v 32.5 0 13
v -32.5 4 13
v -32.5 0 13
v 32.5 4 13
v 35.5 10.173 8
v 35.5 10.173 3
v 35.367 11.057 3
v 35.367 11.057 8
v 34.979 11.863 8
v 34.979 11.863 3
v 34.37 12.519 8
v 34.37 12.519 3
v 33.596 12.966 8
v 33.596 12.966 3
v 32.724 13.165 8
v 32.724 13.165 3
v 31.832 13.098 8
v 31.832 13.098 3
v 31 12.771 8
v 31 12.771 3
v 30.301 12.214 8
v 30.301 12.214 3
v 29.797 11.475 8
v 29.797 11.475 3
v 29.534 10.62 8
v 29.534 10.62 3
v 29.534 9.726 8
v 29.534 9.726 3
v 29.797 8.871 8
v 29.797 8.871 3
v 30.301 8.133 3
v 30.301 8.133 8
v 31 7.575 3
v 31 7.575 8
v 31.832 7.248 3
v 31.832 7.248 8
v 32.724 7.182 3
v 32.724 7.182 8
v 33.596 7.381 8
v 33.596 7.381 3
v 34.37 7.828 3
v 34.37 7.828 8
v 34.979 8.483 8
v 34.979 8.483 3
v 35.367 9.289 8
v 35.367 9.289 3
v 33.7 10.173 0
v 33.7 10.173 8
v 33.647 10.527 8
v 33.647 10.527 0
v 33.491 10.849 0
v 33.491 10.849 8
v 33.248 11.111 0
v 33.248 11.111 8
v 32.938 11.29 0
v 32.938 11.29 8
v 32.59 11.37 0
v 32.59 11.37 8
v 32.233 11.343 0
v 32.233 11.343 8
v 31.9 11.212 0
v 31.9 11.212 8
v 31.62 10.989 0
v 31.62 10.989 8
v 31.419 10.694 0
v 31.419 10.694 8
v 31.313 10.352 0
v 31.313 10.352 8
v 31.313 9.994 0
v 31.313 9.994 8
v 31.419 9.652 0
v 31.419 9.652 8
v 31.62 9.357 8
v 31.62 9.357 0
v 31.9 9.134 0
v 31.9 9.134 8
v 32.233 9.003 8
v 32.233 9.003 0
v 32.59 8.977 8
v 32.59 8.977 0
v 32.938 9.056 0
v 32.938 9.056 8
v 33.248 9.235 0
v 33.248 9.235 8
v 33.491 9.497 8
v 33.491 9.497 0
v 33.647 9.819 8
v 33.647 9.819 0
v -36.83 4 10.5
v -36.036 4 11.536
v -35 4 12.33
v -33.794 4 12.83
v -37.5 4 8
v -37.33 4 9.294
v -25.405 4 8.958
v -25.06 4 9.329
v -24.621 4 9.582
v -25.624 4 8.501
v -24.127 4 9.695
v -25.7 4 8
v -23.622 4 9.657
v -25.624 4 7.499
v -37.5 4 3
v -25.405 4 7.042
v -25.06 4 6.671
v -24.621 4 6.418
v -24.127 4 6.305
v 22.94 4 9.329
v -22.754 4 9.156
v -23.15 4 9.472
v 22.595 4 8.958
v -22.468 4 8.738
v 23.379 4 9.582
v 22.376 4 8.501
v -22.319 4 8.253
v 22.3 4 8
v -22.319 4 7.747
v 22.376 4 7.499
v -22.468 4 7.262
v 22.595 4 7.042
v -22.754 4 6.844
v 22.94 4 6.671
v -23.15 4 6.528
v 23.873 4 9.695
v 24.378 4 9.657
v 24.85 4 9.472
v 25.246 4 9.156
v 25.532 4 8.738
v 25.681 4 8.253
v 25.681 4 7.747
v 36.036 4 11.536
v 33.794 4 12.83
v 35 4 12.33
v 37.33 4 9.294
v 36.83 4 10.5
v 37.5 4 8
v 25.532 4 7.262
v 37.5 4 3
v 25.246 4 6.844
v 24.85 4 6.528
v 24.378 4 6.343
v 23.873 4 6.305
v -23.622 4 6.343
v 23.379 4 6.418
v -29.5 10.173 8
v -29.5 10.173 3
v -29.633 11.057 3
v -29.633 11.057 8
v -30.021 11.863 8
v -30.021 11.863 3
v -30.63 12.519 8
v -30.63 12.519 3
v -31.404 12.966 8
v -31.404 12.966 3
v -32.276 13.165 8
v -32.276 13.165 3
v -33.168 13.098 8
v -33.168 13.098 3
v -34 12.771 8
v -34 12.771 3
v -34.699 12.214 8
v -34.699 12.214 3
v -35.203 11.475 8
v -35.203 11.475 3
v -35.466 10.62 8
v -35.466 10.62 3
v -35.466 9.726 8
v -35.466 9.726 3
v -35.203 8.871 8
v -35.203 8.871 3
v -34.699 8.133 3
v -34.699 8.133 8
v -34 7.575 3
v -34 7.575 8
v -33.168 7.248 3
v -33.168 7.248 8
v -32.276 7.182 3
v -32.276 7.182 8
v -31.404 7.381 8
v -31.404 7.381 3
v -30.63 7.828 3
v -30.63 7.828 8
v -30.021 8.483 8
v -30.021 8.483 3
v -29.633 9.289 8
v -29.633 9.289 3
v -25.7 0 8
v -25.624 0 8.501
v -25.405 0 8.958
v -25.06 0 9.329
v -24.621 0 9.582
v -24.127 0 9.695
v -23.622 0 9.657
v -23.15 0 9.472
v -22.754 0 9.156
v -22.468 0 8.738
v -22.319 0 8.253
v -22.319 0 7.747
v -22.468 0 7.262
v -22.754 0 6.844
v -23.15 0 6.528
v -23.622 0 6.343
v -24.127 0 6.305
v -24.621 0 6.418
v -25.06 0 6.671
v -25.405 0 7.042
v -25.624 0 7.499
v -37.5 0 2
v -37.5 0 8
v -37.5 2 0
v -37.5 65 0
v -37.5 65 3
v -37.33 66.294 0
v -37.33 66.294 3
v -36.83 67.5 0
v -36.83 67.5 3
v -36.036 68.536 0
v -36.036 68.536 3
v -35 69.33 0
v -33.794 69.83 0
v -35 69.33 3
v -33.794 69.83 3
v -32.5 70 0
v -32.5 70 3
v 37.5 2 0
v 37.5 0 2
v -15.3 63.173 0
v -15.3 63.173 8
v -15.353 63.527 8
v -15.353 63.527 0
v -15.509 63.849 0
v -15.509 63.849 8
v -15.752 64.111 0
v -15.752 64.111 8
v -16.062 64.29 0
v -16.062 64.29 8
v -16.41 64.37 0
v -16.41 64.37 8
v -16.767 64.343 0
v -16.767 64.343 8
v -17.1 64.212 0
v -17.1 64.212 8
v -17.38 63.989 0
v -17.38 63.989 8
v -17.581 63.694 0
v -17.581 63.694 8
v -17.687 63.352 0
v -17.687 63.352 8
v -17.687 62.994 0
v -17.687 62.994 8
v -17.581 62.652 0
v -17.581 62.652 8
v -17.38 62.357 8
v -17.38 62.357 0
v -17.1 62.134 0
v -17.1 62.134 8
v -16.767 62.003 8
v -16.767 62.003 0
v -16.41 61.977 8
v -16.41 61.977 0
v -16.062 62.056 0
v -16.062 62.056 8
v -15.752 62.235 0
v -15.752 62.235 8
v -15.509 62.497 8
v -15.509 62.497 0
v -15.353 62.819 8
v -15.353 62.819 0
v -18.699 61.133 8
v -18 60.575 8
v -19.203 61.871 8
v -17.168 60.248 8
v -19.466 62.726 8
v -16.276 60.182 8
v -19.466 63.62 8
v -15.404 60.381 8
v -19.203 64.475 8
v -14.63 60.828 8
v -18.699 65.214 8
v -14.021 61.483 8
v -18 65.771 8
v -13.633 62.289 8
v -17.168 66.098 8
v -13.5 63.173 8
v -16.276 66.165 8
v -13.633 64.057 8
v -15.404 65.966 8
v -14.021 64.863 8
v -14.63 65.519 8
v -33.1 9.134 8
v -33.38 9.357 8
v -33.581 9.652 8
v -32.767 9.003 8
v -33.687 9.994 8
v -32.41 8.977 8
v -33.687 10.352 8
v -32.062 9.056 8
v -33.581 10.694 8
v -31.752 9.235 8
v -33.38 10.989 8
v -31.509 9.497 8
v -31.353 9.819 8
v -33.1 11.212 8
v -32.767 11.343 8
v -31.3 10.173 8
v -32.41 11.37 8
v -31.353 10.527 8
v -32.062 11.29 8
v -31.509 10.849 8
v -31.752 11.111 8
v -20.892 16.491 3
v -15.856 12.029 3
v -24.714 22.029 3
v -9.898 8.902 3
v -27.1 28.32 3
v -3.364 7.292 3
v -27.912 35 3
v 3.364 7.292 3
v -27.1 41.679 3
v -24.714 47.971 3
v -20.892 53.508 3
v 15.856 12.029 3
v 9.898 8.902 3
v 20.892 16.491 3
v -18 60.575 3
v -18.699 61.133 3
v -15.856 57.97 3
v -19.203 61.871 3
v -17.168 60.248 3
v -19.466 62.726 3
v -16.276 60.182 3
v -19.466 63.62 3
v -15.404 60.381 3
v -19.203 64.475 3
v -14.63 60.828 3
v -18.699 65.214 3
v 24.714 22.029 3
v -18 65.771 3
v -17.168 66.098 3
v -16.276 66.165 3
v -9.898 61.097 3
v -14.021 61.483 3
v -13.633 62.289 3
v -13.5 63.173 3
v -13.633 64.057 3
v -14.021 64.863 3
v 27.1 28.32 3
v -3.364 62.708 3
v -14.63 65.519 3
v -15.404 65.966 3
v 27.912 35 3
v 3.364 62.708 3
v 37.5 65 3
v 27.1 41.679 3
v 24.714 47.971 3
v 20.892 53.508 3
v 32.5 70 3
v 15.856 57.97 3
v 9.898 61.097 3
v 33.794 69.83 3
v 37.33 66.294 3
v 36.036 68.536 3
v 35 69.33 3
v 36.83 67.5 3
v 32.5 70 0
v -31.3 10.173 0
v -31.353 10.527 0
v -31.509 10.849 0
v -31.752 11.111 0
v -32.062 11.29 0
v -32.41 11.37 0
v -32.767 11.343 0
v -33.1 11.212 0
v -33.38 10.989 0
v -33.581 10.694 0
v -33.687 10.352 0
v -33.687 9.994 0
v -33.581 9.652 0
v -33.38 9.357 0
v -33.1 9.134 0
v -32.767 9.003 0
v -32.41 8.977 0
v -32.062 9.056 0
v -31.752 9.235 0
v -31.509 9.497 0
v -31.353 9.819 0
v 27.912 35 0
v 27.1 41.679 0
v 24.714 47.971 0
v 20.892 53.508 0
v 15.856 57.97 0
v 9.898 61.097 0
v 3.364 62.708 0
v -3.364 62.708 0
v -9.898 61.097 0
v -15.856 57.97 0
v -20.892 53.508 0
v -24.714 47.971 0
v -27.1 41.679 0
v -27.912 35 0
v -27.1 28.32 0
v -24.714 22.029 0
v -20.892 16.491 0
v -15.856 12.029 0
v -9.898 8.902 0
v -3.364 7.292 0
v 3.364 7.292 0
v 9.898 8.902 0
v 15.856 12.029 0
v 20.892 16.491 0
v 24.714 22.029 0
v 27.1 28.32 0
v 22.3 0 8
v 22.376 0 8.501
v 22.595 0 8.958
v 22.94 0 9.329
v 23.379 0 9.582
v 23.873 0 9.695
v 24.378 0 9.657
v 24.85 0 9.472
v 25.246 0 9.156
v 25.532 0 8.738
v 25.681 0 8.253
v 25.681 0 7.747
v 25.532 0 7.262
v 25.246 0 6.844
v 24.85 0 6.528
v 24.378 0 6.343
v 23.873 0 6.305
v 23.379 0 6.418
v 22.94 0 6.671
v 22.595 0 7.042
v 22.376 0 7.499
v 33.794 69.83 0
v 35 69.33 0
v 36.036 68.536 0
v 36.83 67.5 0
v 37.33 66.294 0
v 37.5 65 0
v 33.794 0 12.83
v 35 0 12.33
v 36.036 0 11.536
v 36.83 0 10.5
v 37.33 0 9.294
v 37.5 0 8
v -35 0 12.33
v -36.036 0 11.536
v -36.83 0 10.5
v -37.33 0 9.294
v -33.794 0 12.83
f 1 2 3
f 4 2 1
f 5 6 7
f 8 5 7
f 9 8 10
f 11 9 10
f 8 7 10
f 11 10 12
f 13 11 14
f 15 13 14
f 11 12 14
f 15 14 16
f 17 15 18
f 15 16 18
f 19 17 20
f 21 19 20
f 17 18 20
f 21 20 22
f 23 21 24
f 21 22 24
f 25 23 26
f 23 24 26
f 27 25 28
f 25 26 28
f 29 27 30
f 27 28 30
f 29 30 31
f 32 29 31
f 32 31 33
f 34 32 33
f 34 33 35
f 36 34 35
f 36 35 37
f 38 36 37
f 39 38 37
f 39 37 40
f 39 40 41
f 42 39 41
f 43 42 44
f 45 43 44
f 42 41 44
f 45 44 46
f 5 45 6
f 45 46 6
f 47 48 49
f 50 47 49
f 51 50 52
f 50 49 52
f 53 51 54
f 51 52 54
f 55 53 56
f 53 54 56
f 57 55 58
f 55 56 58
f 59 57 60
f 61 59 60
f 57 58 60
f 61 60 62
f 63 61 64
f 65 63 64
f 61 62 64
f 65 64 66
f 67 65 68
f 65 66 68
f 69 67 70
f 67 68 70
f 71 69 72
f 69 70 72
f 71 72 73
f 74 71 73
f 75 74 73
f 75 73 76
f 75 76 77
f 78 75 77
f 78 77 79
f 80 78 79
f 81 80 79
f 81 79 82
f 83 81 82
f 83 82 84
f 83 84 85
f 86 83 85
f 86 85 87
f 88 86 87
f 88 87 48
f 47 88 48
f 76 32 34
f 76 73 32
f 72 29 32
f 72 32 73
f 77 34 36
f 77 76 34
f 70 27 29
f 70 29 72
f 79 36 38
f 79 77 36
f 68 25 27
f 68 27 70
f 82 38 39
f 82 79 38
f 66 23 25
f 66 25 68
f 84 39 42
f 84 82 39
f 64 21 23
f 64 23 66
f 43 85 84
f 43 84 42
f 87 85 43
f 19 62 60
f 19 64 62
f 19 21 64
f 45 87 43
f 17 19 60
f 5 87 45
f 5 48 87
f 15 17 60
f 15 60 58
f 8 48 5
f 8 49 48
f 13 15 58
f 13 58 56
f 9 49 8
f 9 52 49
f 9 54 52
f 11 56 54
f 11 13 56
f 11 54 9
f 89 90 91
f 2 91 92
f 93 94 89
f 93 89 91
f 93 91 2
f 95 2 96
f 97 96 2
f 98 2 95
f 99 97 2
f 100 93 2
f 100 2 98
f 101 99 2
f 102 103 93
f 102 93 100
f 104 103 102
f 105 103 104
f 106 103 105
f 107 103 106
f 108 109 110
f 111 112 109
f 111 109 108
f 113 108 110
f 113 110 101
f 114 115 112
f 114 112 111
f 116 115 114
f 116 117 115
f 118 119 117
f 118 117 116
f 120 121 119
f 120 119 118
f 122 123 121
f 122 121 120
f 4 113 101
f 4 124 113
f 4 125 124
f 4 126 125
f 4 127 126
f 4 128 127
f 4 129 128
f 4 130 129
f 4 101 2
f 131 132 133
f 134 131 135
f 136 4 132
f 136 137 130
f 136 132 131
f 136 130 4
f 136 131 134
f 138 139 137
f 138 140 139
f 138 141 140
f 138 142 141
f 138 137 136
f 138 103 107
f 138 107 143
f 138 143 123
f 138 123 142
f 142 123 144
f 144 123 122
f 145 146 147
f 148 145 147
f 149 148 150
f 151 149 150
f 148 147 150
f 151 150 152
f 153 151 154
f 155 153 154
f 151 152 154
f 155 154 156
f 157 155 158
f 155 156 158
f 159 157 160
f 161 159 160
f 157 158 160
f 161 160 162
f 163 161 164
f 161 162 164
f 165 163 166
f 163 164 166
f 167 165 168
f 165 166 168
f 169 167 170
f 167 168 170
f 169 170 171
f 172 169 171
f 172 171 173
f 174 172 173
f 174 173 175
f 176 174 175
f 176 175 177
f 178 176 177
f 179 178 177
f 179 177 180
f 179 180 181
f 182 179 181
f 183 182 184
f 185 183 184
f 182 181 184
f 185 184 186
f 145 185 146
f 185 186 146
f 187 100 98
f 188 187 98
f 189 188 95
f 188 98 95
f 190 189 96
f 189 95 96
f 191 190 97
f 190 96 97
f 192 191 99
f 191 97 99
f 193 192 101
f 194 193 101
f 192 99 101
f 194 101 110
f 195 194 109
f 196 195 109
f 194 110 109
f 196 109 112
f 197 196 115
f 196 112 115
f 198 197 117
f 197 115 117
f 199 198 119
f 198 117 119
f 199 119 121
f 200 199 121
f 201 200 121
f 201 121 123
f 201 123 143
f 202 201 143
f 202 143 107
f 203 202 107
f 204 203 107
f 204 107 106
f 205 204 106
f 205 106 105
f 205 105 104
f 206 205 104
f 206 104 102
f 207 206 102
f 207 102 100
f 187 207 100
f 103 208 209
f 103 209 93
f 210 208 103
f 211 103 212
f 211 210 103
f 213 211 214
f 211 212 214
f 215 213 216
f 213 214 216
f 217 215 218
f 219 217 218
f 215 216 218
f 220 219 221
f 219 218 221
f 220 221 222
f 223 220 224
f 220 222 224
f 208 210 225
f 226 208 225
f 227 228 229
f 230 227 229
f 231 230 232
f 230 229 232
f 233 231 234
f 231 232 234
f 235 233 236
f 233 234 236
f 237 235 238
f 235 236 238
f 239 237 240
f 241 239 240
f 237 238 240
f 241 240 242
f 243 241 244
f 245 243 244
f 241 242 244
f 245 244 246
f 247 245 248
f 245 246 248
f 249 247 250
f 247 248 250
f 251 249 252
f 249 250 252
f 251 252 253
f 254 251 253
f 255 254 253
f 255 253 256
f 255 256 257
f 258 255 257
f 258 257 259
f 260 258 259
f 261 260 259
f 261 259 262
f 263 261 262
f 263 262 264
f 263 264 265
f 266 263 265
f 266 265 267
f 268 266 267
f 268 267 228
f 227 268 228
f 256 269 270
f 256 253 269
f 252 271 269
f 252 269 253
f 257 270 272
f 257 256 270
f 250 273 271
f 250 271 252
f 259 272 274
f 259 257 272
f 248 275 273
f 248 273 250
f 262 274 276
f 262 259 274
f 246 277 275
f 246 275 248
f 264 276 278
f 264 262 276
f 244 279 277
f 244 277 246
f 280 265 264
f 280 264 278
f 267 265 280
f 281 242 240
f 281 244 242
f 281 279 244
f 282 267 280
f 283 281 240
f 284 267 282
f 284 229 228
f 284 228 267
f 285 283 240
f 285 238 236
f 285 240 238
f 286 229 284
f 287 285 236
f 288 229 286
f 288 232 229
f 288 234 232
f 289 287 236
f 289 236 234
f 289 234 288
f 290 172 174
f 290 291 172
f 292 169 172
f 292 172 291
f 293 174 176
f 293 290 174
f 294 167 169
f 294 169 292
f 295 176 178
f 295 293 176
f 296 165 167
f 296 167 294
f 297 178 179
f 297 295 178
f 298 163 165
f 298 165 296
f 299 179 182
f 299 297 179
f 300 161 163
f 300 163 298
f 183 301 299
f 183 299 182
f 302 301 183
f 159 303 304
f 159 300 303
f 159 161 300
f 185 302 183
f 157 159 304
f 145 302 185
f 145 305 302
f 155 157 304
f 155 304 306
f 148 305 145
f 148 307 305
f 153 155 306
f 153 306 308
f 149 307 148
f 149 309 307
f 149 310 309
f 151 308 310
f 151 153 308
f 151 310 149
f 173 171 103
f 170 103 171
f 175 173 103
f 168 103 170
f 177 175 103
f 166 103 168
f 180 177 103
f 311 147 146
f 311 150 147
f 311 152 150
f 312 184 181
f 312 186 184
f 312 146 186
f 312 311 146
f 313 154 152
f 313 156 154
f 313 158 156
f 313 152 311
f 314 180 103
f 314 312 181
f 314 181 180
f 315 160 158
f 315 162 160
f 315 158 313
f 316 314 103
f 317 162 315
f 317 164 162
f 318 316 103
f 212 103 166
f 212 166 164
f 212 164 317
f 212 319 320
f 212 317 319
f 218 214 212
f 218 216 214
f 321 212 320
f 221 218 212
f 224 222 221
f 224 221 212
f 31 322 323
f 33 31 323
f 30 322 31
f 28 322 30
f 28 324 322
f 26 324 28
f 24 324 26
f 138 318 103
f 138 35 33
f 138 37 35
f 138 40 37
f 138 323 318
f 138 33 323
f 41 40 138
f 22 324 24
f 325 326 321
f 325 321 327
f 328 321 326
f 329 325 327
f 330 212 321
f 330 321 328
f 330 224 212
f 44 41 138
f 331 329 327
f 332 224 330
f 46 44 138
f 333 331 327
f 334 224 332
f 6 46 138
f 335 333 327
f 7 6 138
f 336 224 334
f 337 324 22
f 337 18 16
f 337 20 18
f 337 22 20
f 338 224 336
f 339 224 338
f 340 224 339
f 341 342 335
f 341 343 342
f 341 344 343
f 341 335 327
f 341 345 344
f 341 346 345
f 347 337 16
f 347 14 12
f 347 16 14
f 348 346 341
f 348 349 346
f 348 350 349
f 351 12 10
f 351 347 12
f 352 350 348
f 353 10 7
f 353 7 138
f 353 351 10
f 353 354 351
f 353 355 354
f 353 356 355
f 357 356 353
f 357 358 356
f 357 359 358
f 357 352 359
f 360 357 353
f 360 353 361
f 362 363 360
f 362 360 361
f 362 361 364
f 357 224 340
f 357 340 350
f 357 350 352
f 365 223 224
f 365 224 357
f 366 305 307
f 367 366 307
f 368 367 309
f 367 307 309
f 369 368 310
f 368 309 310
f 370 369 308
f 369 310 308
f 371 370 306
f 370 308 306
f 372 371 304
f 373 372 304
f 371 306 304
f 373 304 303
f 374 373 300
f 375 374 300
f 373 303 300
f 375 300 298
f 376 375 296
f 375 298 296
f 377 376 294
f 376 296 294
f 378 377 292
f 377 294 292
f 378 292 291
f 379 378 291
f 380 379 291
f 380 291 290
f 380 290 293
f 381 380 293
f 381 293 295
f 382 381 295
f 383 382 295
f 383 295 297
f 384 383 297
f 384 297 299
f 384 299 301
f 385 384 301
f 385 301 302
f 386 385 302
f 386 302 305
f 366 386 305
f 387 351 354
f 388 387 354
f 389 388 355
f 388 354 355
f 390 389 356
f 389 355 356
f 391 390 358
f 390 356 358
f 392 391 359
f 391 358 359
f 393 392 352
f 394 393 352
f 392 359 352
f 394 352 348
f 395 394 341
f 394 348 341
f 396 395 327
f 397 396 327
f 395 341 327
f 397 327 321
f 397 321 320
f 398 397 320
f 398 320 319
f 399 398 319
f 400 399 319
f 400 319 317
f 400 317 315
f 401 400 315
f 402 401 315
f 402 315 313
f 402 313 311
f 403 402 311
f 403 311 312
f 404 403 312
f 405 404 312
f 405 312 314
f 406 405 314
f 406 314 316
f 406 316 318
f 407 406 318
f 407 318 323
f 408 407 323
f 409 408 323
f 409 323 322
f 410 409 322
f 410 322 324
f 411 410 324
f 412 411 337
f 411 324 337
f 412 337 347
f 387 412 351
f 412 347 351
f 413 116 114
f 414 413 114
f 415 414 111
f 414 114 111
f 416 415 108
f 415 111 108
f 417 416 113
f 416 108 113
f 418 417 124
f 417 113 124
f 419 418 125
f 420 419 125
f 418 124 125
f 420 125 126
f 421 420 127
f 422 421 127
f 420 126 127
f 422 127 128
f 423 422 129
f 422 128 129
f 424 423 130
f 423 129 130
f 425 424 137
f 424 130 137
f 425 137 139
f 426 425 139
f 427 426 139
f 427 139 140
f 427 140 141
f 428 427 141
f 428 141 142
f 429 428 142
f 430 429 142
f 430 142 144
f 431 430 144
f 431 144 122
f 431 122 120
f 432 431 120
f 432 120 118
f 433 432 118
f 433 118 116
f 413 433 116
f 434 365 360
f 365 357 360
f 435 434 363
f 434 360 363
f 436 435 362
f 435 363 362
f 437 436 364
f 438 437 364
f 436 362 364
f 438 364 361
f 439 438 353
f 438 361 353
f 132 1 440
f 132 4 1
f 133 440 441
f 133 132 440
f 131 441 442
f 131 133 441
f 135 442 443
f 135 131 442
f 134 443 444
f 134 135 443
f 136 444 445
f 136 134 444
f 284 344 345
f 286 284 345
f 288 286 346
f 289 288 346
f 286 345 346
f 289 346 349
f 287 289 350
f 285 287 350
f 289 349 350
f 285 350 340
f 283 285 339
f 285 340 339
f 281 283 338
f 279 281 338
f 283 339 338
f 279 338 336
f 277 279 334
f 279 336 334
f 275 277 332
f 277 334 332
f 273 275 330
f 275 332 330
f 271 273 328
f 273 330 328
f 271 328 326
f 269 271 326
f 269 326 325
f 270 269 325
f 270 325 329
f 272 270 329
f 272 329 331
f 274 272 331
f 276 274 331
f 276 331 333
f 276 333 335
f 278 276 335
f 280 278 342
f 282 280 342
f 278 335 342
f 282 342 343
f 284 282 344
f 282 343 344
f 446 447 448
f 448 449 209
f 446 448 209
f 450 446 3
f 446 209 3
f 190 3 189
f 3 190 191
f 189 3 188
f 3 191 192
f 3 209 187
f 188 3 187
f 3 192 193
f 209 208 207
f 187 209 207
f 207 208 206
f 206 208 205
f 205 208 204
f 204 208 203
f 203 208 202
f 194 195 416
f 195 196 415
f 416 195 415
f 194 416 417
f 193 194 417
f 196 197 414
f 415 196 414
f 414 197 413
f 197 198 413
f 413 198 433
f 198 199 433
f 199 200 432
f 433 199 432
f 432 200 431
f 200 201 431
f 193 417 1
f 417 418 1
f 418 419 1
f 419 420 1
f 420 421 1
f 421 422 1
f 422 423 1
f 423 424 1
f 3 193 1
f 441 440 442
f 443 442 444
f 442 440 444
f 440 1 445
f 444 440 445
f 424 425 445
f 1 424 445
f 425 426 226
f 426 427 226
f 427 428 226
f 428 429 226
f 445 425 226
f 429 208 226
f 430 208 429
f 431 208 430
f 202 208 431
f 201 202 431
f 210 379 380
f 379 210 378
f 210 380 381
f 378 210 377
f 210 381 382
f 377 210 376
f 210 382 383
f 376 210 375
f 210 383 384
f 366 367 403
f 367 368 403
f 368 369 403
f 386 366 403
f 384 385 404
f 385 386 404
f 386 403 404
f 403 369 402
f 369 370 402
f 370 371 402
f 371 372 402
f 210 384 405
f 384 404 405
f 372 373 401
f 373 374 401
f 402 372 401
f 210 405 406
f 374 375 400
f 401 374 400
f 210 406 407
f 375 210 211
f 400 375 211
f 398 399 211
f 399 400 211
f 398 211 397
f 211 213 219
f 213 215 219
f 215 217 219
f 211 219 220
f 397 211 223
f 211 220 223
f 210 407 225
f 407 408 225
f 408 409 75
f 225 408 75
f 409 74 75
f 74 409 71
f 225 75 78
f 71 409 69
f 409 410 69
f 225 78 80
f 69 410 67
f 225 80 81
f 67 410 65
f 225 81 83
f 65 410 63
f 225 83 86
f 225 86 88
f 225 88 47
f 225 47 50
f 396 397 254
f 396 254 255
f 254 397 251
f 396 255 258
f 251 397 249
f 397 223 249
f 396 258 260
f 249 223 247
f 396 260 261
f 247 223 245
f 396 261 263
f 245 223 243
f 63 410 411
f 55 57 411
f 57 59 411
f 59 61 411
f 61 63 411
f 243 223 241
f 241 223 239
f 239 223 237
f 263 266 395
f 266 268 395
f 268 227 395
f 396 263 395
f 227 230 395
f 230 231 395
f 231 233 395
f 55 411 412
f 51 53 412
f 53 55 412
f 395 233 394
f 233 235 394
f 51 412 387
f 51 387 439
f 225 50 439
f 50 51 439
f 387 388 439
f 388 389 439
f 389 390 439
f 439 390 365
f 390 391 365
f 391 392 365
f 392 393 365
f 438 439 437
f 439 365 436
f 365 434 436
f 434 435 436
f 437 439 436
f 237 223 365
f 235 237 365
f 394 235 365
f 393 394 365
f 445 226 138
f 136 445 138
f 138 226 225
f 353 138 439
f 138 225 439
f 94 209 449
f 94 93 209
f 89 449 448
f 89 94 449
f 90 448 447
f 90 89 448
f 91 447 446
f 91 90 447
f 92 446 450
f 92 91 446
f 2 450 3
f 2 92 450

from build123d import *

# Parameters (mm, degrees)
SKETCH_W        = 75
SKETCH_H        = 70
PAD_DEPTH       = 3
SKETCH001_W     = 75
SKETCH001_H     = 4
PAD001_DEPTH    = 10
SKETCH002_R     = 3
PAD002_DEPTH    = 5
SKETCH003_R     = 1.2
POCKET_DEPTH    = 8.001
SKETCH004_R     = 1.7
POCKET001_DEPTH = 5
SKETCH005_R     = 27.911549
POCKET002_DEPTH = 5
FILLET_R        = 5
CHAMFER_SIZE    = 2


with BuildPart() as part:
    # Sketch → Pad (new body)
    with BuildSketch(Plane.XY):
        with Locations((0, 35)):
            Rectangle(SKETCH_W, SKETCH_H)
    extrude(amount=PAD_DEPTH)

    # Sketch001 → Pad001 (new body)
    with BuildSketch(Plane.XY.offset(3)):
        with Locations((0, 2)):
            Rectangle(SKETCH001_W, SKETCH001_H)
    extrude(amount=PAD001_DEPTH)

    # Sketch002 → Pad002 (new body)
    with BuildSketch(Plane.XY.offset(3)):
        with Locations((-16.5, 63.173148)):
            Circle(SKETCH002_R)
        with Locations((32.5, 10.173148)):
            Circle(SKETCH002_R)
        with Locations((-32.5, 10.173148)):
            Circle(SKETCH002_R)
    extrude(amount=PAD002_DEPTH)

    # Sketch003 → Pocket (cut, through all)
    with BuildSketch(Plane.XY.offset(8)):
        with Locations((-16.5, 63.173148)):
            Circle(SKETCH003_R)
        with Locations((32.5, 10.173148)):
            Circle(SKETCH003_R)
        with Locations((-32.5, 10.173148)):
            Circle(SKETCH003_R)
    extrude(amount=-POCKET_DEPTH, mode=Mode.SUBTRACT)

    # Sketch004 → Pocket001 (cut)
    with BuildSketch(Plane(origin=(0, 4, 0), x_dir=(-1, 0, 0), z_dir=(0, 1, 0))):
        with Locations((-24, 8)):
            Circle(SKETCH004_R)
        with Locations((24, 8)):
            Circle(SKETCH004_R)
    extrude(amount=-POCKET001_DEPTH, mode=Mode.SUBTRACT)

    # Sketch005 → Pocket002 (cut)
    with BuildSketch(Plane.XY.offset(3)):
        with Locations((0, 34.999702)):
            Circle(SKETCH005_R)
    extrude(amount=-POCKET002_DEPTH, mode=Mode.SUBTRACT)

    # Fillet
    fillet_edges = [part.edges().sort_by_distance(p)[0] for p in [
        (-37.5, 70, 1.5),
        (37.5, 70, 1.5),
        (37.5, 2, 13),
        (-37.5, 2, 13),
    ]]
    fillet(fillet_edges, radius=FILLET_R)

    # Chamfer
    chamfer_edges = [part.edges().sort_by_distance(p)[0] for p in [
        (0, 0, 0),
    ]]
    chamfer(chamfer_edges, length=CHAMFER_SIZE)


solid = part.part
